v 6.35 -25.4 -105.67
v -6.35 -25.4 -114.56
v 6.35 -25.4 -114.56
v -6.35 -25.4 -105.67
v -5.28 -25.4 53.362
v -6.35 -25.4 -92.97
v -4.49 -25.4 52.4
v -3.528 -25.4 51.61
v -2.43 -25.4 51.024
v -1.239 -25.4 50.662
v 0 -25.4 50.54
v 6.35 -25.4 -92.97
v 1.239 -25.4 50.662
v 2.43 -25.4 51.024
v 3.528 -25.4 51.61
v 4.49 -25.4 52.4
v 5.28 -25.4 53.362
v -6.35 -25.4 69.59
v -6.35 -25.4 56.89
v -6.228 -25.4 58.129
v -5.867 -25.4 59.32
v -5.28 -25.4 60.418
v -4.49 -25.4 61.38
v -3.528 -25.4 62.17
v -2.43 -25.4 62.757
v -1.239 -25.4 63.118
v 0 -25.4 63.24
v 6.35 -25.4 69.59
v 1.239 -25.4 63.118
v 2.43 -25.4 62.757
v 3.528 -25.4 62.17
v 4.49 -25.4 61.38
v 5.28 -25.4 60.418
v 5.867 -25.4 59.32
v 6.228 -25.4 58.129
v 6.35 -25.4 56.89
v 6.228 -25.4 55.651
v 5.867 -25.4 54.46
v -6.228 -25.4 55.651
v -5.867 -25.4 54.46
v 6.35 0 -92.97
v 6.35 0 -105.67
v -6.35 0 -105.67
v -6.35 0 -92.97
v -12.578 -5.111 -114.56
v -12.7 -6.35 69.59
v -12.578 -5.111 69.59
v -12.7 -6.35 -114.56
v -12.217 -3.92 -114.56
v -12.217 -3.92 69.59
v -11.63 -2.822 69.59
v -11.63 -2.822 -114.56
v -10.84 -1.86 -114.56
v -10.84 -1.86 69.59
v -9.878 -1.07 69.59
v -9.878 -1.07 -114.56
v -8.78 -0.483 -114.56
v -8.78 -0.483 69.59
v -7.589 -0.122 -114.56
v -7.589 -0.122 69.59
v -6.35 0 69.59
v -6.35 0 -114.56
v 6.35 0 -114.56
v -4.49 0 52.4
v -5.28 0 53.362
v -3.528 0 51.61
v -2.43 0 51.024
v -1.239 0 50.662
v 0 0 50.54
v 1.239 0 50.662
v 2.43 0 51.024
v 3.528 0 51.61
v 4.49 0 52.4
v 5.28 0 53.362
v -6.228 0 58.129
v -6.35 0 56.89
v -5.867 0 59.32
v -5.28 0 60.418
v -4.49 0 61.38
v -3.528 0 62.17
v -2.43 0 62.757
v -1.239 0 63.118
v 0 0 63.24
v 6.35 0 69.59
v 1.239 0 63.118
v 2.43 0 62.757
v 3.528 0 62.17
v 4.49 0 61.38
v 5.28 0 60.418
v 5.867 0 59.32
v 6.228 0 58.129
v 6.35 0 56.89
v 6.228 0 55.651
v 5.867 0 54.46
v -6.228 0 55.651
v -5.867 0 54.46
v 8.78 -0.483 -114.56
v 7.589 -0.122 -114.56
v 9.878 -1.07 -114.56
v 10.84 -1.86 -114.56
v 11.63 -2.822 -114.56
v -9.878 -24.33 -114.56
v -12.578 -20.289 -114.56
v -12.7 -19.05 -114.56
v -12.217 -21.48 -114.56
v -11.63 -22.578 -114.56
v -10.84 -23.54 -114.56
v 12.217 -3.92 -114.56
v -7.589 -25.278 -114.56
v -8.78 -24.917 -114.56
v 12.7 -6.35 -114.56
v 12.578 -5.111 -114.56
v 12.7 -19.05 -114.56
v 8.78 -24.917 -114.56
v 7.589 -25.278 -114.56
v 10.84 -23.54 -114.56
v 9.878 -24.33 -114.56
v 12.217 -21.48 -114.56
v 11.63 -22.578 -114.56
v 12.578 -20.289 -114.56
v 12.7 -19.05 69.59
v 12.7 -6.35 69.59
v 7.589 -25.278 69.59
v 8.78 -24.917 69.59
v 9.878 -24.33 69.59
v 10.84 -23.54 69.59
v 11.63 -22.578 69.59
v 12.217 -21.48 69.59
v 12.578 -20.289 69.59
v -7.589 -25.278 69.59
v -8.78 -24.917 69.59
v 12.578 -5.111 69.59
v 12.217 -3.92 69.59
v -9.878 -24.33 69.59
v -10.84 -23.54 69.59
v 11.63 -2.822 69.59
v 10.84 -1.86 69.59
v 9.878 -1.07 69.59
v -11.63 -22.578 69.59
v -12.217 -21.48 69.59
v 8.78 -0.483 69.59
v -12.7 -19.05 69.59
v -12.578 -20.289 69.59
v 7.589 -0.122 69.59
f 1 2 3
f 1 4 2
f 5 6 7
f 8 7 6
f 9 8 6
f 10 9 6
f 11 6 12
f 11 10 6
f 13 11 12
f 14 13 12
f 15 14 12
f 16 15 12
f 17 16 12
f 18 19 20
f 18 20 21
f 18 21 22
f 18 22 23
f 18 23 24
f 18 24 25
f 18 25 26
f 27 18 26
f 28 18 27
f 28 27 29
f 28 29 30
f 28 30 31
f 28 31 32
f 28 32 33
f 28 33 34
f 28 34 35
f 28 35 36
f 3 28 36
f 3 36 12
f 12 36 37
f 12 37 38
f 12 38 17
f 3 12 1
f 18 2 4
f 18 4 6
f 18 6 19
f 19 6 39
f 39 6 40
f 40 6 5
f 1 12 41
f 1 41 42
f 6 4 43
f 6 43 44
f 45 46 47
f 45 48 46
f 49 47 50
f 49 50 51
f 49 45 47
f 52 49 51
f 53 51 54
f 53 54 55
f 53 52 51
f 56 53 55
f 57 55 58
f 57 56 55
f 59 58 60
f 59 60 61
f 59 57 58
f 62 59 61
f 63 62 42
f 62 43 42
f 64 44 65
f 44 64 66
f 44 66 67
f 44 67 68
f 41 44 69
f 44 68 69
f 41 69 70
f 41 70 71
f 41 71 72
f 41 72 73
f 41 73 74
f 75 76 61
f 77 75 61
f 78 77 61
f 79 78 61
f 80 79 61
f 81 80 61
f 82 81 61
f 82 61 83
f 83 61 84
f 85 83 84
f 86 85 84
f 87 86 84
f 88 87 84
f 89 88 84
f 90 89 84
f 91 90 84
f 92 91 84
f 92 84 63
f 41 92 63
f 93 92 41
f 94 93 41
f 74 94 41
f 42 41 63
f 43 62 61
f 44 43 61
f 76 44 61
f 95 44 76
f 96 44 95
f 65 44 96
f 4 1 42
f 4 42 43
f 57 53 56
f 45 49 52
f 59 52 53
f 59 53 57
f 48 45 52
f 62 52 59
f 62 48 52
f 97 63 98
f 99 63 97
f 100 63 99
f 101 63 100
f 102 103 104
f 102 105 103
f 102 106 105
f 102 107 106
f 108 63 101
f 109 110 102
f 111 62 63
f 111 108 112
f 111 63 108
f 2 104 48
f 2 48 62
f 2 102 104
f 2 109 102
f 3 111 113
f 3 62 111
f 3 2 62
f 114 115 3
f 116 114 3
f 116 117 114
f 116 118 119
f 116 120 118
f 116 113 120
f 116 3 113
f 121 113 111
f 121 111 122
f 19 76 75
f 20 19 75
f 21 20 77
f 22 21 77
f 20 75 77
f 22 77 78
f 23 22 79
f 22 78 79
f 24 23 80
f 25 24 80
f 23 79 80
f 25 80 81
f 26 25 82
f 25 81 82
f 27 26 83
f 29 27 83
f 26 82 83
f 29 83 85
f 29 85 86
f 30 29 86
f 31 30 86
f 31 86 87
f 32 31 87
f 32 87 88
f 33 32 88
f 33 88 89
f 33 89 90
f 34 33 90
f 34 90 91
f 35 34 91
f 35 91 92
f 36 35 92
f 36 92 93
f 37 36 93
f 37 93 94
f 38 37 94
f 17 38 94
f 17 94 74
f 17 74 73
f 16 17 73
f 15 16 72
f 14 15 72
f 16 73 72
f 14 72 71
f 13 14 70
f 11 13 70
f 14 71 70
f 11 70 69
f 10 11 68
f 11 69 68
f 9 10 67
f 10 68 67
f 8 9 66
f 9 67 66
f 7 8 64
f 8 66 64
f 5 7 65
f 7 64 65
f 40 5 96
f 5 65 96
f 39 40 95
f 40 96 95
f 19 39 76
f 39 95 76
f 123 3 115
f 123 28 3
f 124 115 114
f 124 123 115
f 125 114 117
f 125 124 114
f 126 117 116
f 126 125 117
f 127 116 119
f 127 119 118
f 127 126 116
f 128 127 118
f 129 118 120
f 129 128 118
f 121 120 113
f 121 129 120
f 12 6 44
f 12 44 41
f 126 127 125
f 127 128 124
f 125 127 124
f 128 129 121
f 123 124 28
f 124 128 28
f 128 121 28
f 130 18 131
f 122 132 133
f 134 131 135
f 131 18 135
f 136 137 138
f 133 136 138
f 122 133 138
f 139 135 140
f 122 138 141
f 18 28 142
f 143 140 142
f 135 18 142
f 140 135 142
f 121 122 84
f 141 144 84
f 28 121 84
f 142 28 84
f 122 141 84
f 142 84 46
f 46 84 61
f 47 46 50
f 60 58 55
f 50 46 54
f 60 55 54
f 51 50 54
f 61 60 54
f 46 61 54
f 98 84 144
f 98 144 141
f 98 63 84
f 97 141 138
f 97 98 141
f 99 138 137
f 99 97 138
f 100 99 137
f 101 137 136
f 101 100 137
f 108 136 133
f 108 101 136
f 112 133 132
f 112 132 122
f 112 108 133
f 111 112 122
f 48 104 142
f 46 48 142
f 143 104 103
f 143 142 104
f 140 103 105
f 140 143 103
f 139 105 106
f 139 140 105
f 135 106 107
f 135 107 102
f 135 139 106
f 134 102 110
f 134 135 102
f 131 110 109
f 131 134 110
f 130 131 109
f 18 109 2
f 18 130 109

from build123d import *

# Parameters (mm, degrees)
F1_DEPTH = 25.4
F3_D     = 12.7
F3_DEPTH = 254
F3_TIP   = 3.8154649308
F4_W     = 25.4
F4_H     = 82.55
F5_DEPTH = 25.4
F7_DEPTH = 25.4
F8_R     = 6.34999


# Not quite as in the source:
# - a fillet or chamfer is up to 0.001 mm smaller than in the source, because OpenCascade refuses the exact size


with BuildPart() as f1:
    # F0 (on Front) → F1 (new body)
    with BuildSketch(Plane.XZ):
        Polygon((-12.7, -32.0098340811), (0, -32.0098340811), (12.7, -32.0098340811), (12.7, 69.5901659189), (-12.7, 69.5901659189), align=None)
    extrude(amount=F1_DEPTH)

    # F3
    with Locations(Plane.XZ.offset(25.4)):
        with Locations((0, 56.8901659189)):
            Hole(F3_D / 2, depth=F3_DEPTH)
            with Locations((0, 0, -(F3_DEPTH + F3_TIP / 2))):  # 118° drill point
                Cone(0, F3_D / 2, F3_TIP, mode=Mode.SUBTRACT)

    # F4 (on face) → F5 (join)
    with BuildSketch(Plane.XZ.offset(25.4)):
        with Locations((0, -73.2848340811)):
            Rectangle(F4_W, F4_H)
    extrude(amount=-F5_DEPTH)

    # F6 (on face) → F7 (cut)
    with BuildSketch(Plane(origin=(0, 0, 0), x_dir=(-1, 0, 0), z_dir=(0, 1, 0))):
        Polygon((0, -105.6698340811), (6.35, -105.6698340811), (6.35, -92.9698340811), (-6.35, -92.9698340811), (-6.35, -105.6698340811), align=None)
    extrude(amount=-F7_DEPTH, mode=Mode.SUBTRACT)

    # F8 (radius 6.35 in the source; OpenCascade refuses exactly that, so slightly less here)
    f8_edges = [f1.edges().sort_by_distance(p)[0] for p in [
        (12.7, 0, -22.484834),
        (-12.7, 0, -22.484834),
        (-12.7, -25.4, -22.484834),
        (12.7, -25.4, -22.484834),
    ]]
    fillet(f8_edges, radius=F8_R)


solid = f1.part
